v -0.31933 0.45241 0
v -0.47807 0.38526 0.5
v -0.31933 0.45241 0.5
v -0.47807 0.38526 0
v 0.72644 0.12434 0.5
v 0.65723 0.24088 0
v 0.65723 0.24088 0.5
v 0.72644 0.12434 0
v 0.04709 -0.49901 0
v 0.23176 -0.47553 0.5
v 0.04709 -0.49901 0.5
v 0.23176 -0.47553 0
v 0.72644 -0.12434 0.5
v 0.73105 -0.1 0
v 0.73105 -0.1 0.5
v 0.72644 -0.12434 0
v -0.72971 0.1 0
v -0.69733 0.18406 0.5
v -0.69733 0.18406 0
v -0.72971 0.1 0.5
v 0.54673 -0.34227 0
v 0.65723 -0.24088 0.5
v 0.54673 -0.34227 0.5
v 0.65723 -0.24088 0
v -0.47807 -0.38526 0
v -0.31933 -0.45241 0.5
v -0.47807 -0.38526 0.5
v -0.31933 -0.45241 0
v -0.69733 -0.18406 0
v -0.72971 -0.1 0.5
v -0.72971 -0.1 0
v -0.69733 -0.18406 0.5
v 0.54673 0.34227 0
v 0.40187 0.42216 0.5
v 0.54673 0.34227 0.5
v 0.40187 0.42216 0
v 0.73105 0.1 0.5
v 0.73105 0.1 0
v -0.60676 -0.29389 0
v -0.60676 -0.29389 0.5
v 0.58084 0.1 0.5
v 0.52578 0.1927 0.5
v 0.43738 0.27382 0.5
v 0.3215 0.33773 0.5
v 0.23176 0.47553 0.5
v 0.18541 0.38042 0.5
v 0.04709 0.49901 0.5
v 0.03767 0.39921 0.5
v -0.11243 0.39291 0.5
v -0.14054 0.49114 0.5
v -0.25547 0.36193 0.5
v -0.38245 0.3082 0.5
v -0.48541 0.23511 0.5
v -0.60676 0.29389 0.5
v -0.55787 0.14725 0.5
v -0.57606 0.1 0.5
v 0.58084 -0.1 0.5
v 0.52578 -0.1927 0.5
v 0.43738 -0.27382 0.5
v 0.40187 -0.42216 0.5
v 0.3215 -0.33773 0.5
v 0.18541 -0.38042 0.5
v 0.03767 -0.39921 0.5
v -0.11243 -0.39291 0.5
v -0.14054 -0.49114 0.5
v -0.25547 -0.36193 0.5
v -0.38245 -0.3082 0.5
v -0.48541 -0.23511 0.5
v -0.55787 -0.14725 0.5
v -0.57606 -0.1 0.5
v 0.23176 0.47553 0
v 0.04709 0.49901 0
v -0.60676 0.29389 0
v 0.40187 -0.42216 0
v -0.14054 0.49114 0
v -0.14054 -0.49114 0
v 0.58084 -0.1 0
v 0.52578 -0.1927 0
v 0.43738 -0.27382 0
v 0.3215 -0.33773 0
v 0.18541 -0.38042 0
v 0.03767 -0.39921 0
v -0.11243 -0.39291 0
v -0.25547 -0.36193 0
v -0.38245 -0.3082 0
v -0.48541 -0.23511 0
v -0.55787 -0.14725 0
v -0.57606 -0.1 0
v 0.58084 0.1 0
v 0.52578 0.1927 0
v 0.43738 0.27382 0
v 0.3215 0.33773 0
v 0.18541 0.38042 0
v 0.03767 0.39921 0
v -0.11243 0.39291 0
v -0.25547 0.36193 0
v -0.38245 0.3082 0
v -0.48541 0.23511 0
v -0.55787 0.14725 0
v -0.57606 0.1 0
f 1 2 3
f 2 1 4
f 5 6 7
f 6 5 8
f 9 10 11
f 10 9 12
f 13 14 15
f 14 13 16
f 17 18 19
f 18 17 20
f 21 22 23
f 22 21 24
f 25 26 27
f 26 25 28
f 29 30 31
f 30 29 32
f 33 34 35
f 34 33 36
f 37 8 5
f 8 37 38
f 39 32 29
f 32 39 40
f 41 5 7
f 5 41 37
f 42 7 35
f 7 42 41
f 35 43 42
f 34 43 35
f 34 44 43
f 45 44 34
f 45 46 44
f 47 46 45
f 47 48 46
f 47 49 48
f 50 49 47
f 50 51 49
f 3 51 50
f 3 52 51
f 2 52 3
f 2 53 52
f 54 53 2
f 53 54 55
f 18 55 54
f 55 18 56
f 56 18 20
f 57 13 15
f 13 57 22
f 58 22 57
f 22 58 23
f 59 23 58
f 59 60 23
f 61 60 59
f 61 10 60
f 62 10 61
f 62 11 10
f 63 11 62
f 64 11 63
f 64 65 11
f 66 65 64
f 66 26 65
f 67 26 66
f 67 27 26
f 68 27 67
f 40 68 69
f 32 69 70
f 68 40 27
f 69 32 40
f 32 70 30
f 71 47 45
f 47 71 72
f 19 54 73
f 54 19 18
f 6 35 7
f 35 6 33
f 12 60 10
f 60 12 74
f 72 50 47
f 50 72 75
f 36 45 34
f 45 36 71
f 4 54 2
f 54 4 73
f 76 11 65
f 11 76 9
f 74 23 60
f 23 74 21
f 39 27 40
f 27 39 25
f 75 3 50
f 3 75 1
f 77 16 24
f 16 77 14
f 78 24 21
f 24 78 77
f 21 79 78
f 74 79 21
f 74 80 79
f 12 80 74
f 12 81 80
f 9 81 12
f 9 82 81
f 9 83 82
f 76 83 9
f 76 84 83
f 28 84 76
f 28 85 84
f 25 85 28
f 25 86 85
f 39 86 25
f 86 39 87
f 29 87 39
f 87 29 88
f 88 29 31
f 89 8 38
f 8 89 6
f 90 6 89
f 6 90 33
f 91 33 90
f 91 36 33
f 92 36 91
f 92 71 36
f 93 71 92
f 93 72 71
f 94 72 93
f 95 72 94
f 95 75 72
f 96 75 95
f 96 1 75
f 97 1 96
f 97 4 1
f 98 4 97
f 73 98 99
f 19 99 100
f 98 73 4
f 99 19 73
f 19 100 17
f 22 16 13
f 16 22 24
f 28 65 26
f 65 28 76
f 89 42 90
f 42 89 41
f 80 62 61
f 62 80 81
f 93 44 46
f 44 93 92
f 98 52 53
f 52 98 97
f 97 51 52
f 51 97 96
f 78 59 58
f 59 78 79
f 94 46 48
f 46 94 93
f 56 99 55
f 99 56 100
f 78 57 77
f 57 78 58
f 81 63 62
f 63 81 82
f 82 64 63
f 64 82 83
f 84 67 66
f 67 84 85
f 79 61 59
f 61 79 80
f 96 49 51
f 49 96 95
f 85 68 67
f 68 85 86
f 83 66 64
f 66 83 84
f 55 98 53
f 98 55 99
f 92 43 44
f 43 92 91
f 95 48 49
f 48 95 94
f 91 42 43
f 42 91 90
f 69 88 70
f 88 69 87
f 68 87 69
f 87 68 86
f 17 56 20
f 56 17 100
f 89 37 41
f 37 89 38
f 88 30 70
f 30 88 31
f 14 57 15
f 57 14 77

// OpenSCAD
// Generated by SolidPython 1.1.3 on 2024-10-24 15:45:58
$fn = 25;


difference() {
	scale(v = [1.5000000000, 1, 1]) {
		cylinder(h = 0.5000000000, r = 0.5000000000);
	}
	scale(v = [1.5000000000, 1, 1]) {
		cylinder(h = 0.6000000000, r = 0.4000000000);
	}
	scale(v = [2, 0.2000000000, 2]) {
		translate(v = [-0.5000000000, -0.5000000000, 0]) {
			cube();
		}
	}
}
/***********************************************
*********      SolidPython code:      **********
************************************************
 
# SolidPython example code 
# Brygg Ullmer, Clemson University
# Written 2021-10-27

from solid import *        # load in SolidPython/SCAD support code

#c1 = cylinder(r=.3, h=.6)
cy1  = cylinder(r=.5, h=.5)
cy1b = scale([1.5, 1, 1])(cy1)

cy2  = cylinder(r=.4, h=.6)
cy2b = scale([1.5, 1, 1])(cy2)

cu1  = cube()
cu1a = translate([-.5, -.5, 0])(cu1)
cu1b = scale([2, .2, 2])(cu1a)

outGeom = cy1b - cy2b - cu1b

radialSegments = 25; hdr = '$fn = %s;' % radialSegments # create a header for the export
scad_render_to_file(outGeom, 'exSolid03a.scad', file_header=hdr) # write the .scad file

### end ###

 
 
************************************************/
